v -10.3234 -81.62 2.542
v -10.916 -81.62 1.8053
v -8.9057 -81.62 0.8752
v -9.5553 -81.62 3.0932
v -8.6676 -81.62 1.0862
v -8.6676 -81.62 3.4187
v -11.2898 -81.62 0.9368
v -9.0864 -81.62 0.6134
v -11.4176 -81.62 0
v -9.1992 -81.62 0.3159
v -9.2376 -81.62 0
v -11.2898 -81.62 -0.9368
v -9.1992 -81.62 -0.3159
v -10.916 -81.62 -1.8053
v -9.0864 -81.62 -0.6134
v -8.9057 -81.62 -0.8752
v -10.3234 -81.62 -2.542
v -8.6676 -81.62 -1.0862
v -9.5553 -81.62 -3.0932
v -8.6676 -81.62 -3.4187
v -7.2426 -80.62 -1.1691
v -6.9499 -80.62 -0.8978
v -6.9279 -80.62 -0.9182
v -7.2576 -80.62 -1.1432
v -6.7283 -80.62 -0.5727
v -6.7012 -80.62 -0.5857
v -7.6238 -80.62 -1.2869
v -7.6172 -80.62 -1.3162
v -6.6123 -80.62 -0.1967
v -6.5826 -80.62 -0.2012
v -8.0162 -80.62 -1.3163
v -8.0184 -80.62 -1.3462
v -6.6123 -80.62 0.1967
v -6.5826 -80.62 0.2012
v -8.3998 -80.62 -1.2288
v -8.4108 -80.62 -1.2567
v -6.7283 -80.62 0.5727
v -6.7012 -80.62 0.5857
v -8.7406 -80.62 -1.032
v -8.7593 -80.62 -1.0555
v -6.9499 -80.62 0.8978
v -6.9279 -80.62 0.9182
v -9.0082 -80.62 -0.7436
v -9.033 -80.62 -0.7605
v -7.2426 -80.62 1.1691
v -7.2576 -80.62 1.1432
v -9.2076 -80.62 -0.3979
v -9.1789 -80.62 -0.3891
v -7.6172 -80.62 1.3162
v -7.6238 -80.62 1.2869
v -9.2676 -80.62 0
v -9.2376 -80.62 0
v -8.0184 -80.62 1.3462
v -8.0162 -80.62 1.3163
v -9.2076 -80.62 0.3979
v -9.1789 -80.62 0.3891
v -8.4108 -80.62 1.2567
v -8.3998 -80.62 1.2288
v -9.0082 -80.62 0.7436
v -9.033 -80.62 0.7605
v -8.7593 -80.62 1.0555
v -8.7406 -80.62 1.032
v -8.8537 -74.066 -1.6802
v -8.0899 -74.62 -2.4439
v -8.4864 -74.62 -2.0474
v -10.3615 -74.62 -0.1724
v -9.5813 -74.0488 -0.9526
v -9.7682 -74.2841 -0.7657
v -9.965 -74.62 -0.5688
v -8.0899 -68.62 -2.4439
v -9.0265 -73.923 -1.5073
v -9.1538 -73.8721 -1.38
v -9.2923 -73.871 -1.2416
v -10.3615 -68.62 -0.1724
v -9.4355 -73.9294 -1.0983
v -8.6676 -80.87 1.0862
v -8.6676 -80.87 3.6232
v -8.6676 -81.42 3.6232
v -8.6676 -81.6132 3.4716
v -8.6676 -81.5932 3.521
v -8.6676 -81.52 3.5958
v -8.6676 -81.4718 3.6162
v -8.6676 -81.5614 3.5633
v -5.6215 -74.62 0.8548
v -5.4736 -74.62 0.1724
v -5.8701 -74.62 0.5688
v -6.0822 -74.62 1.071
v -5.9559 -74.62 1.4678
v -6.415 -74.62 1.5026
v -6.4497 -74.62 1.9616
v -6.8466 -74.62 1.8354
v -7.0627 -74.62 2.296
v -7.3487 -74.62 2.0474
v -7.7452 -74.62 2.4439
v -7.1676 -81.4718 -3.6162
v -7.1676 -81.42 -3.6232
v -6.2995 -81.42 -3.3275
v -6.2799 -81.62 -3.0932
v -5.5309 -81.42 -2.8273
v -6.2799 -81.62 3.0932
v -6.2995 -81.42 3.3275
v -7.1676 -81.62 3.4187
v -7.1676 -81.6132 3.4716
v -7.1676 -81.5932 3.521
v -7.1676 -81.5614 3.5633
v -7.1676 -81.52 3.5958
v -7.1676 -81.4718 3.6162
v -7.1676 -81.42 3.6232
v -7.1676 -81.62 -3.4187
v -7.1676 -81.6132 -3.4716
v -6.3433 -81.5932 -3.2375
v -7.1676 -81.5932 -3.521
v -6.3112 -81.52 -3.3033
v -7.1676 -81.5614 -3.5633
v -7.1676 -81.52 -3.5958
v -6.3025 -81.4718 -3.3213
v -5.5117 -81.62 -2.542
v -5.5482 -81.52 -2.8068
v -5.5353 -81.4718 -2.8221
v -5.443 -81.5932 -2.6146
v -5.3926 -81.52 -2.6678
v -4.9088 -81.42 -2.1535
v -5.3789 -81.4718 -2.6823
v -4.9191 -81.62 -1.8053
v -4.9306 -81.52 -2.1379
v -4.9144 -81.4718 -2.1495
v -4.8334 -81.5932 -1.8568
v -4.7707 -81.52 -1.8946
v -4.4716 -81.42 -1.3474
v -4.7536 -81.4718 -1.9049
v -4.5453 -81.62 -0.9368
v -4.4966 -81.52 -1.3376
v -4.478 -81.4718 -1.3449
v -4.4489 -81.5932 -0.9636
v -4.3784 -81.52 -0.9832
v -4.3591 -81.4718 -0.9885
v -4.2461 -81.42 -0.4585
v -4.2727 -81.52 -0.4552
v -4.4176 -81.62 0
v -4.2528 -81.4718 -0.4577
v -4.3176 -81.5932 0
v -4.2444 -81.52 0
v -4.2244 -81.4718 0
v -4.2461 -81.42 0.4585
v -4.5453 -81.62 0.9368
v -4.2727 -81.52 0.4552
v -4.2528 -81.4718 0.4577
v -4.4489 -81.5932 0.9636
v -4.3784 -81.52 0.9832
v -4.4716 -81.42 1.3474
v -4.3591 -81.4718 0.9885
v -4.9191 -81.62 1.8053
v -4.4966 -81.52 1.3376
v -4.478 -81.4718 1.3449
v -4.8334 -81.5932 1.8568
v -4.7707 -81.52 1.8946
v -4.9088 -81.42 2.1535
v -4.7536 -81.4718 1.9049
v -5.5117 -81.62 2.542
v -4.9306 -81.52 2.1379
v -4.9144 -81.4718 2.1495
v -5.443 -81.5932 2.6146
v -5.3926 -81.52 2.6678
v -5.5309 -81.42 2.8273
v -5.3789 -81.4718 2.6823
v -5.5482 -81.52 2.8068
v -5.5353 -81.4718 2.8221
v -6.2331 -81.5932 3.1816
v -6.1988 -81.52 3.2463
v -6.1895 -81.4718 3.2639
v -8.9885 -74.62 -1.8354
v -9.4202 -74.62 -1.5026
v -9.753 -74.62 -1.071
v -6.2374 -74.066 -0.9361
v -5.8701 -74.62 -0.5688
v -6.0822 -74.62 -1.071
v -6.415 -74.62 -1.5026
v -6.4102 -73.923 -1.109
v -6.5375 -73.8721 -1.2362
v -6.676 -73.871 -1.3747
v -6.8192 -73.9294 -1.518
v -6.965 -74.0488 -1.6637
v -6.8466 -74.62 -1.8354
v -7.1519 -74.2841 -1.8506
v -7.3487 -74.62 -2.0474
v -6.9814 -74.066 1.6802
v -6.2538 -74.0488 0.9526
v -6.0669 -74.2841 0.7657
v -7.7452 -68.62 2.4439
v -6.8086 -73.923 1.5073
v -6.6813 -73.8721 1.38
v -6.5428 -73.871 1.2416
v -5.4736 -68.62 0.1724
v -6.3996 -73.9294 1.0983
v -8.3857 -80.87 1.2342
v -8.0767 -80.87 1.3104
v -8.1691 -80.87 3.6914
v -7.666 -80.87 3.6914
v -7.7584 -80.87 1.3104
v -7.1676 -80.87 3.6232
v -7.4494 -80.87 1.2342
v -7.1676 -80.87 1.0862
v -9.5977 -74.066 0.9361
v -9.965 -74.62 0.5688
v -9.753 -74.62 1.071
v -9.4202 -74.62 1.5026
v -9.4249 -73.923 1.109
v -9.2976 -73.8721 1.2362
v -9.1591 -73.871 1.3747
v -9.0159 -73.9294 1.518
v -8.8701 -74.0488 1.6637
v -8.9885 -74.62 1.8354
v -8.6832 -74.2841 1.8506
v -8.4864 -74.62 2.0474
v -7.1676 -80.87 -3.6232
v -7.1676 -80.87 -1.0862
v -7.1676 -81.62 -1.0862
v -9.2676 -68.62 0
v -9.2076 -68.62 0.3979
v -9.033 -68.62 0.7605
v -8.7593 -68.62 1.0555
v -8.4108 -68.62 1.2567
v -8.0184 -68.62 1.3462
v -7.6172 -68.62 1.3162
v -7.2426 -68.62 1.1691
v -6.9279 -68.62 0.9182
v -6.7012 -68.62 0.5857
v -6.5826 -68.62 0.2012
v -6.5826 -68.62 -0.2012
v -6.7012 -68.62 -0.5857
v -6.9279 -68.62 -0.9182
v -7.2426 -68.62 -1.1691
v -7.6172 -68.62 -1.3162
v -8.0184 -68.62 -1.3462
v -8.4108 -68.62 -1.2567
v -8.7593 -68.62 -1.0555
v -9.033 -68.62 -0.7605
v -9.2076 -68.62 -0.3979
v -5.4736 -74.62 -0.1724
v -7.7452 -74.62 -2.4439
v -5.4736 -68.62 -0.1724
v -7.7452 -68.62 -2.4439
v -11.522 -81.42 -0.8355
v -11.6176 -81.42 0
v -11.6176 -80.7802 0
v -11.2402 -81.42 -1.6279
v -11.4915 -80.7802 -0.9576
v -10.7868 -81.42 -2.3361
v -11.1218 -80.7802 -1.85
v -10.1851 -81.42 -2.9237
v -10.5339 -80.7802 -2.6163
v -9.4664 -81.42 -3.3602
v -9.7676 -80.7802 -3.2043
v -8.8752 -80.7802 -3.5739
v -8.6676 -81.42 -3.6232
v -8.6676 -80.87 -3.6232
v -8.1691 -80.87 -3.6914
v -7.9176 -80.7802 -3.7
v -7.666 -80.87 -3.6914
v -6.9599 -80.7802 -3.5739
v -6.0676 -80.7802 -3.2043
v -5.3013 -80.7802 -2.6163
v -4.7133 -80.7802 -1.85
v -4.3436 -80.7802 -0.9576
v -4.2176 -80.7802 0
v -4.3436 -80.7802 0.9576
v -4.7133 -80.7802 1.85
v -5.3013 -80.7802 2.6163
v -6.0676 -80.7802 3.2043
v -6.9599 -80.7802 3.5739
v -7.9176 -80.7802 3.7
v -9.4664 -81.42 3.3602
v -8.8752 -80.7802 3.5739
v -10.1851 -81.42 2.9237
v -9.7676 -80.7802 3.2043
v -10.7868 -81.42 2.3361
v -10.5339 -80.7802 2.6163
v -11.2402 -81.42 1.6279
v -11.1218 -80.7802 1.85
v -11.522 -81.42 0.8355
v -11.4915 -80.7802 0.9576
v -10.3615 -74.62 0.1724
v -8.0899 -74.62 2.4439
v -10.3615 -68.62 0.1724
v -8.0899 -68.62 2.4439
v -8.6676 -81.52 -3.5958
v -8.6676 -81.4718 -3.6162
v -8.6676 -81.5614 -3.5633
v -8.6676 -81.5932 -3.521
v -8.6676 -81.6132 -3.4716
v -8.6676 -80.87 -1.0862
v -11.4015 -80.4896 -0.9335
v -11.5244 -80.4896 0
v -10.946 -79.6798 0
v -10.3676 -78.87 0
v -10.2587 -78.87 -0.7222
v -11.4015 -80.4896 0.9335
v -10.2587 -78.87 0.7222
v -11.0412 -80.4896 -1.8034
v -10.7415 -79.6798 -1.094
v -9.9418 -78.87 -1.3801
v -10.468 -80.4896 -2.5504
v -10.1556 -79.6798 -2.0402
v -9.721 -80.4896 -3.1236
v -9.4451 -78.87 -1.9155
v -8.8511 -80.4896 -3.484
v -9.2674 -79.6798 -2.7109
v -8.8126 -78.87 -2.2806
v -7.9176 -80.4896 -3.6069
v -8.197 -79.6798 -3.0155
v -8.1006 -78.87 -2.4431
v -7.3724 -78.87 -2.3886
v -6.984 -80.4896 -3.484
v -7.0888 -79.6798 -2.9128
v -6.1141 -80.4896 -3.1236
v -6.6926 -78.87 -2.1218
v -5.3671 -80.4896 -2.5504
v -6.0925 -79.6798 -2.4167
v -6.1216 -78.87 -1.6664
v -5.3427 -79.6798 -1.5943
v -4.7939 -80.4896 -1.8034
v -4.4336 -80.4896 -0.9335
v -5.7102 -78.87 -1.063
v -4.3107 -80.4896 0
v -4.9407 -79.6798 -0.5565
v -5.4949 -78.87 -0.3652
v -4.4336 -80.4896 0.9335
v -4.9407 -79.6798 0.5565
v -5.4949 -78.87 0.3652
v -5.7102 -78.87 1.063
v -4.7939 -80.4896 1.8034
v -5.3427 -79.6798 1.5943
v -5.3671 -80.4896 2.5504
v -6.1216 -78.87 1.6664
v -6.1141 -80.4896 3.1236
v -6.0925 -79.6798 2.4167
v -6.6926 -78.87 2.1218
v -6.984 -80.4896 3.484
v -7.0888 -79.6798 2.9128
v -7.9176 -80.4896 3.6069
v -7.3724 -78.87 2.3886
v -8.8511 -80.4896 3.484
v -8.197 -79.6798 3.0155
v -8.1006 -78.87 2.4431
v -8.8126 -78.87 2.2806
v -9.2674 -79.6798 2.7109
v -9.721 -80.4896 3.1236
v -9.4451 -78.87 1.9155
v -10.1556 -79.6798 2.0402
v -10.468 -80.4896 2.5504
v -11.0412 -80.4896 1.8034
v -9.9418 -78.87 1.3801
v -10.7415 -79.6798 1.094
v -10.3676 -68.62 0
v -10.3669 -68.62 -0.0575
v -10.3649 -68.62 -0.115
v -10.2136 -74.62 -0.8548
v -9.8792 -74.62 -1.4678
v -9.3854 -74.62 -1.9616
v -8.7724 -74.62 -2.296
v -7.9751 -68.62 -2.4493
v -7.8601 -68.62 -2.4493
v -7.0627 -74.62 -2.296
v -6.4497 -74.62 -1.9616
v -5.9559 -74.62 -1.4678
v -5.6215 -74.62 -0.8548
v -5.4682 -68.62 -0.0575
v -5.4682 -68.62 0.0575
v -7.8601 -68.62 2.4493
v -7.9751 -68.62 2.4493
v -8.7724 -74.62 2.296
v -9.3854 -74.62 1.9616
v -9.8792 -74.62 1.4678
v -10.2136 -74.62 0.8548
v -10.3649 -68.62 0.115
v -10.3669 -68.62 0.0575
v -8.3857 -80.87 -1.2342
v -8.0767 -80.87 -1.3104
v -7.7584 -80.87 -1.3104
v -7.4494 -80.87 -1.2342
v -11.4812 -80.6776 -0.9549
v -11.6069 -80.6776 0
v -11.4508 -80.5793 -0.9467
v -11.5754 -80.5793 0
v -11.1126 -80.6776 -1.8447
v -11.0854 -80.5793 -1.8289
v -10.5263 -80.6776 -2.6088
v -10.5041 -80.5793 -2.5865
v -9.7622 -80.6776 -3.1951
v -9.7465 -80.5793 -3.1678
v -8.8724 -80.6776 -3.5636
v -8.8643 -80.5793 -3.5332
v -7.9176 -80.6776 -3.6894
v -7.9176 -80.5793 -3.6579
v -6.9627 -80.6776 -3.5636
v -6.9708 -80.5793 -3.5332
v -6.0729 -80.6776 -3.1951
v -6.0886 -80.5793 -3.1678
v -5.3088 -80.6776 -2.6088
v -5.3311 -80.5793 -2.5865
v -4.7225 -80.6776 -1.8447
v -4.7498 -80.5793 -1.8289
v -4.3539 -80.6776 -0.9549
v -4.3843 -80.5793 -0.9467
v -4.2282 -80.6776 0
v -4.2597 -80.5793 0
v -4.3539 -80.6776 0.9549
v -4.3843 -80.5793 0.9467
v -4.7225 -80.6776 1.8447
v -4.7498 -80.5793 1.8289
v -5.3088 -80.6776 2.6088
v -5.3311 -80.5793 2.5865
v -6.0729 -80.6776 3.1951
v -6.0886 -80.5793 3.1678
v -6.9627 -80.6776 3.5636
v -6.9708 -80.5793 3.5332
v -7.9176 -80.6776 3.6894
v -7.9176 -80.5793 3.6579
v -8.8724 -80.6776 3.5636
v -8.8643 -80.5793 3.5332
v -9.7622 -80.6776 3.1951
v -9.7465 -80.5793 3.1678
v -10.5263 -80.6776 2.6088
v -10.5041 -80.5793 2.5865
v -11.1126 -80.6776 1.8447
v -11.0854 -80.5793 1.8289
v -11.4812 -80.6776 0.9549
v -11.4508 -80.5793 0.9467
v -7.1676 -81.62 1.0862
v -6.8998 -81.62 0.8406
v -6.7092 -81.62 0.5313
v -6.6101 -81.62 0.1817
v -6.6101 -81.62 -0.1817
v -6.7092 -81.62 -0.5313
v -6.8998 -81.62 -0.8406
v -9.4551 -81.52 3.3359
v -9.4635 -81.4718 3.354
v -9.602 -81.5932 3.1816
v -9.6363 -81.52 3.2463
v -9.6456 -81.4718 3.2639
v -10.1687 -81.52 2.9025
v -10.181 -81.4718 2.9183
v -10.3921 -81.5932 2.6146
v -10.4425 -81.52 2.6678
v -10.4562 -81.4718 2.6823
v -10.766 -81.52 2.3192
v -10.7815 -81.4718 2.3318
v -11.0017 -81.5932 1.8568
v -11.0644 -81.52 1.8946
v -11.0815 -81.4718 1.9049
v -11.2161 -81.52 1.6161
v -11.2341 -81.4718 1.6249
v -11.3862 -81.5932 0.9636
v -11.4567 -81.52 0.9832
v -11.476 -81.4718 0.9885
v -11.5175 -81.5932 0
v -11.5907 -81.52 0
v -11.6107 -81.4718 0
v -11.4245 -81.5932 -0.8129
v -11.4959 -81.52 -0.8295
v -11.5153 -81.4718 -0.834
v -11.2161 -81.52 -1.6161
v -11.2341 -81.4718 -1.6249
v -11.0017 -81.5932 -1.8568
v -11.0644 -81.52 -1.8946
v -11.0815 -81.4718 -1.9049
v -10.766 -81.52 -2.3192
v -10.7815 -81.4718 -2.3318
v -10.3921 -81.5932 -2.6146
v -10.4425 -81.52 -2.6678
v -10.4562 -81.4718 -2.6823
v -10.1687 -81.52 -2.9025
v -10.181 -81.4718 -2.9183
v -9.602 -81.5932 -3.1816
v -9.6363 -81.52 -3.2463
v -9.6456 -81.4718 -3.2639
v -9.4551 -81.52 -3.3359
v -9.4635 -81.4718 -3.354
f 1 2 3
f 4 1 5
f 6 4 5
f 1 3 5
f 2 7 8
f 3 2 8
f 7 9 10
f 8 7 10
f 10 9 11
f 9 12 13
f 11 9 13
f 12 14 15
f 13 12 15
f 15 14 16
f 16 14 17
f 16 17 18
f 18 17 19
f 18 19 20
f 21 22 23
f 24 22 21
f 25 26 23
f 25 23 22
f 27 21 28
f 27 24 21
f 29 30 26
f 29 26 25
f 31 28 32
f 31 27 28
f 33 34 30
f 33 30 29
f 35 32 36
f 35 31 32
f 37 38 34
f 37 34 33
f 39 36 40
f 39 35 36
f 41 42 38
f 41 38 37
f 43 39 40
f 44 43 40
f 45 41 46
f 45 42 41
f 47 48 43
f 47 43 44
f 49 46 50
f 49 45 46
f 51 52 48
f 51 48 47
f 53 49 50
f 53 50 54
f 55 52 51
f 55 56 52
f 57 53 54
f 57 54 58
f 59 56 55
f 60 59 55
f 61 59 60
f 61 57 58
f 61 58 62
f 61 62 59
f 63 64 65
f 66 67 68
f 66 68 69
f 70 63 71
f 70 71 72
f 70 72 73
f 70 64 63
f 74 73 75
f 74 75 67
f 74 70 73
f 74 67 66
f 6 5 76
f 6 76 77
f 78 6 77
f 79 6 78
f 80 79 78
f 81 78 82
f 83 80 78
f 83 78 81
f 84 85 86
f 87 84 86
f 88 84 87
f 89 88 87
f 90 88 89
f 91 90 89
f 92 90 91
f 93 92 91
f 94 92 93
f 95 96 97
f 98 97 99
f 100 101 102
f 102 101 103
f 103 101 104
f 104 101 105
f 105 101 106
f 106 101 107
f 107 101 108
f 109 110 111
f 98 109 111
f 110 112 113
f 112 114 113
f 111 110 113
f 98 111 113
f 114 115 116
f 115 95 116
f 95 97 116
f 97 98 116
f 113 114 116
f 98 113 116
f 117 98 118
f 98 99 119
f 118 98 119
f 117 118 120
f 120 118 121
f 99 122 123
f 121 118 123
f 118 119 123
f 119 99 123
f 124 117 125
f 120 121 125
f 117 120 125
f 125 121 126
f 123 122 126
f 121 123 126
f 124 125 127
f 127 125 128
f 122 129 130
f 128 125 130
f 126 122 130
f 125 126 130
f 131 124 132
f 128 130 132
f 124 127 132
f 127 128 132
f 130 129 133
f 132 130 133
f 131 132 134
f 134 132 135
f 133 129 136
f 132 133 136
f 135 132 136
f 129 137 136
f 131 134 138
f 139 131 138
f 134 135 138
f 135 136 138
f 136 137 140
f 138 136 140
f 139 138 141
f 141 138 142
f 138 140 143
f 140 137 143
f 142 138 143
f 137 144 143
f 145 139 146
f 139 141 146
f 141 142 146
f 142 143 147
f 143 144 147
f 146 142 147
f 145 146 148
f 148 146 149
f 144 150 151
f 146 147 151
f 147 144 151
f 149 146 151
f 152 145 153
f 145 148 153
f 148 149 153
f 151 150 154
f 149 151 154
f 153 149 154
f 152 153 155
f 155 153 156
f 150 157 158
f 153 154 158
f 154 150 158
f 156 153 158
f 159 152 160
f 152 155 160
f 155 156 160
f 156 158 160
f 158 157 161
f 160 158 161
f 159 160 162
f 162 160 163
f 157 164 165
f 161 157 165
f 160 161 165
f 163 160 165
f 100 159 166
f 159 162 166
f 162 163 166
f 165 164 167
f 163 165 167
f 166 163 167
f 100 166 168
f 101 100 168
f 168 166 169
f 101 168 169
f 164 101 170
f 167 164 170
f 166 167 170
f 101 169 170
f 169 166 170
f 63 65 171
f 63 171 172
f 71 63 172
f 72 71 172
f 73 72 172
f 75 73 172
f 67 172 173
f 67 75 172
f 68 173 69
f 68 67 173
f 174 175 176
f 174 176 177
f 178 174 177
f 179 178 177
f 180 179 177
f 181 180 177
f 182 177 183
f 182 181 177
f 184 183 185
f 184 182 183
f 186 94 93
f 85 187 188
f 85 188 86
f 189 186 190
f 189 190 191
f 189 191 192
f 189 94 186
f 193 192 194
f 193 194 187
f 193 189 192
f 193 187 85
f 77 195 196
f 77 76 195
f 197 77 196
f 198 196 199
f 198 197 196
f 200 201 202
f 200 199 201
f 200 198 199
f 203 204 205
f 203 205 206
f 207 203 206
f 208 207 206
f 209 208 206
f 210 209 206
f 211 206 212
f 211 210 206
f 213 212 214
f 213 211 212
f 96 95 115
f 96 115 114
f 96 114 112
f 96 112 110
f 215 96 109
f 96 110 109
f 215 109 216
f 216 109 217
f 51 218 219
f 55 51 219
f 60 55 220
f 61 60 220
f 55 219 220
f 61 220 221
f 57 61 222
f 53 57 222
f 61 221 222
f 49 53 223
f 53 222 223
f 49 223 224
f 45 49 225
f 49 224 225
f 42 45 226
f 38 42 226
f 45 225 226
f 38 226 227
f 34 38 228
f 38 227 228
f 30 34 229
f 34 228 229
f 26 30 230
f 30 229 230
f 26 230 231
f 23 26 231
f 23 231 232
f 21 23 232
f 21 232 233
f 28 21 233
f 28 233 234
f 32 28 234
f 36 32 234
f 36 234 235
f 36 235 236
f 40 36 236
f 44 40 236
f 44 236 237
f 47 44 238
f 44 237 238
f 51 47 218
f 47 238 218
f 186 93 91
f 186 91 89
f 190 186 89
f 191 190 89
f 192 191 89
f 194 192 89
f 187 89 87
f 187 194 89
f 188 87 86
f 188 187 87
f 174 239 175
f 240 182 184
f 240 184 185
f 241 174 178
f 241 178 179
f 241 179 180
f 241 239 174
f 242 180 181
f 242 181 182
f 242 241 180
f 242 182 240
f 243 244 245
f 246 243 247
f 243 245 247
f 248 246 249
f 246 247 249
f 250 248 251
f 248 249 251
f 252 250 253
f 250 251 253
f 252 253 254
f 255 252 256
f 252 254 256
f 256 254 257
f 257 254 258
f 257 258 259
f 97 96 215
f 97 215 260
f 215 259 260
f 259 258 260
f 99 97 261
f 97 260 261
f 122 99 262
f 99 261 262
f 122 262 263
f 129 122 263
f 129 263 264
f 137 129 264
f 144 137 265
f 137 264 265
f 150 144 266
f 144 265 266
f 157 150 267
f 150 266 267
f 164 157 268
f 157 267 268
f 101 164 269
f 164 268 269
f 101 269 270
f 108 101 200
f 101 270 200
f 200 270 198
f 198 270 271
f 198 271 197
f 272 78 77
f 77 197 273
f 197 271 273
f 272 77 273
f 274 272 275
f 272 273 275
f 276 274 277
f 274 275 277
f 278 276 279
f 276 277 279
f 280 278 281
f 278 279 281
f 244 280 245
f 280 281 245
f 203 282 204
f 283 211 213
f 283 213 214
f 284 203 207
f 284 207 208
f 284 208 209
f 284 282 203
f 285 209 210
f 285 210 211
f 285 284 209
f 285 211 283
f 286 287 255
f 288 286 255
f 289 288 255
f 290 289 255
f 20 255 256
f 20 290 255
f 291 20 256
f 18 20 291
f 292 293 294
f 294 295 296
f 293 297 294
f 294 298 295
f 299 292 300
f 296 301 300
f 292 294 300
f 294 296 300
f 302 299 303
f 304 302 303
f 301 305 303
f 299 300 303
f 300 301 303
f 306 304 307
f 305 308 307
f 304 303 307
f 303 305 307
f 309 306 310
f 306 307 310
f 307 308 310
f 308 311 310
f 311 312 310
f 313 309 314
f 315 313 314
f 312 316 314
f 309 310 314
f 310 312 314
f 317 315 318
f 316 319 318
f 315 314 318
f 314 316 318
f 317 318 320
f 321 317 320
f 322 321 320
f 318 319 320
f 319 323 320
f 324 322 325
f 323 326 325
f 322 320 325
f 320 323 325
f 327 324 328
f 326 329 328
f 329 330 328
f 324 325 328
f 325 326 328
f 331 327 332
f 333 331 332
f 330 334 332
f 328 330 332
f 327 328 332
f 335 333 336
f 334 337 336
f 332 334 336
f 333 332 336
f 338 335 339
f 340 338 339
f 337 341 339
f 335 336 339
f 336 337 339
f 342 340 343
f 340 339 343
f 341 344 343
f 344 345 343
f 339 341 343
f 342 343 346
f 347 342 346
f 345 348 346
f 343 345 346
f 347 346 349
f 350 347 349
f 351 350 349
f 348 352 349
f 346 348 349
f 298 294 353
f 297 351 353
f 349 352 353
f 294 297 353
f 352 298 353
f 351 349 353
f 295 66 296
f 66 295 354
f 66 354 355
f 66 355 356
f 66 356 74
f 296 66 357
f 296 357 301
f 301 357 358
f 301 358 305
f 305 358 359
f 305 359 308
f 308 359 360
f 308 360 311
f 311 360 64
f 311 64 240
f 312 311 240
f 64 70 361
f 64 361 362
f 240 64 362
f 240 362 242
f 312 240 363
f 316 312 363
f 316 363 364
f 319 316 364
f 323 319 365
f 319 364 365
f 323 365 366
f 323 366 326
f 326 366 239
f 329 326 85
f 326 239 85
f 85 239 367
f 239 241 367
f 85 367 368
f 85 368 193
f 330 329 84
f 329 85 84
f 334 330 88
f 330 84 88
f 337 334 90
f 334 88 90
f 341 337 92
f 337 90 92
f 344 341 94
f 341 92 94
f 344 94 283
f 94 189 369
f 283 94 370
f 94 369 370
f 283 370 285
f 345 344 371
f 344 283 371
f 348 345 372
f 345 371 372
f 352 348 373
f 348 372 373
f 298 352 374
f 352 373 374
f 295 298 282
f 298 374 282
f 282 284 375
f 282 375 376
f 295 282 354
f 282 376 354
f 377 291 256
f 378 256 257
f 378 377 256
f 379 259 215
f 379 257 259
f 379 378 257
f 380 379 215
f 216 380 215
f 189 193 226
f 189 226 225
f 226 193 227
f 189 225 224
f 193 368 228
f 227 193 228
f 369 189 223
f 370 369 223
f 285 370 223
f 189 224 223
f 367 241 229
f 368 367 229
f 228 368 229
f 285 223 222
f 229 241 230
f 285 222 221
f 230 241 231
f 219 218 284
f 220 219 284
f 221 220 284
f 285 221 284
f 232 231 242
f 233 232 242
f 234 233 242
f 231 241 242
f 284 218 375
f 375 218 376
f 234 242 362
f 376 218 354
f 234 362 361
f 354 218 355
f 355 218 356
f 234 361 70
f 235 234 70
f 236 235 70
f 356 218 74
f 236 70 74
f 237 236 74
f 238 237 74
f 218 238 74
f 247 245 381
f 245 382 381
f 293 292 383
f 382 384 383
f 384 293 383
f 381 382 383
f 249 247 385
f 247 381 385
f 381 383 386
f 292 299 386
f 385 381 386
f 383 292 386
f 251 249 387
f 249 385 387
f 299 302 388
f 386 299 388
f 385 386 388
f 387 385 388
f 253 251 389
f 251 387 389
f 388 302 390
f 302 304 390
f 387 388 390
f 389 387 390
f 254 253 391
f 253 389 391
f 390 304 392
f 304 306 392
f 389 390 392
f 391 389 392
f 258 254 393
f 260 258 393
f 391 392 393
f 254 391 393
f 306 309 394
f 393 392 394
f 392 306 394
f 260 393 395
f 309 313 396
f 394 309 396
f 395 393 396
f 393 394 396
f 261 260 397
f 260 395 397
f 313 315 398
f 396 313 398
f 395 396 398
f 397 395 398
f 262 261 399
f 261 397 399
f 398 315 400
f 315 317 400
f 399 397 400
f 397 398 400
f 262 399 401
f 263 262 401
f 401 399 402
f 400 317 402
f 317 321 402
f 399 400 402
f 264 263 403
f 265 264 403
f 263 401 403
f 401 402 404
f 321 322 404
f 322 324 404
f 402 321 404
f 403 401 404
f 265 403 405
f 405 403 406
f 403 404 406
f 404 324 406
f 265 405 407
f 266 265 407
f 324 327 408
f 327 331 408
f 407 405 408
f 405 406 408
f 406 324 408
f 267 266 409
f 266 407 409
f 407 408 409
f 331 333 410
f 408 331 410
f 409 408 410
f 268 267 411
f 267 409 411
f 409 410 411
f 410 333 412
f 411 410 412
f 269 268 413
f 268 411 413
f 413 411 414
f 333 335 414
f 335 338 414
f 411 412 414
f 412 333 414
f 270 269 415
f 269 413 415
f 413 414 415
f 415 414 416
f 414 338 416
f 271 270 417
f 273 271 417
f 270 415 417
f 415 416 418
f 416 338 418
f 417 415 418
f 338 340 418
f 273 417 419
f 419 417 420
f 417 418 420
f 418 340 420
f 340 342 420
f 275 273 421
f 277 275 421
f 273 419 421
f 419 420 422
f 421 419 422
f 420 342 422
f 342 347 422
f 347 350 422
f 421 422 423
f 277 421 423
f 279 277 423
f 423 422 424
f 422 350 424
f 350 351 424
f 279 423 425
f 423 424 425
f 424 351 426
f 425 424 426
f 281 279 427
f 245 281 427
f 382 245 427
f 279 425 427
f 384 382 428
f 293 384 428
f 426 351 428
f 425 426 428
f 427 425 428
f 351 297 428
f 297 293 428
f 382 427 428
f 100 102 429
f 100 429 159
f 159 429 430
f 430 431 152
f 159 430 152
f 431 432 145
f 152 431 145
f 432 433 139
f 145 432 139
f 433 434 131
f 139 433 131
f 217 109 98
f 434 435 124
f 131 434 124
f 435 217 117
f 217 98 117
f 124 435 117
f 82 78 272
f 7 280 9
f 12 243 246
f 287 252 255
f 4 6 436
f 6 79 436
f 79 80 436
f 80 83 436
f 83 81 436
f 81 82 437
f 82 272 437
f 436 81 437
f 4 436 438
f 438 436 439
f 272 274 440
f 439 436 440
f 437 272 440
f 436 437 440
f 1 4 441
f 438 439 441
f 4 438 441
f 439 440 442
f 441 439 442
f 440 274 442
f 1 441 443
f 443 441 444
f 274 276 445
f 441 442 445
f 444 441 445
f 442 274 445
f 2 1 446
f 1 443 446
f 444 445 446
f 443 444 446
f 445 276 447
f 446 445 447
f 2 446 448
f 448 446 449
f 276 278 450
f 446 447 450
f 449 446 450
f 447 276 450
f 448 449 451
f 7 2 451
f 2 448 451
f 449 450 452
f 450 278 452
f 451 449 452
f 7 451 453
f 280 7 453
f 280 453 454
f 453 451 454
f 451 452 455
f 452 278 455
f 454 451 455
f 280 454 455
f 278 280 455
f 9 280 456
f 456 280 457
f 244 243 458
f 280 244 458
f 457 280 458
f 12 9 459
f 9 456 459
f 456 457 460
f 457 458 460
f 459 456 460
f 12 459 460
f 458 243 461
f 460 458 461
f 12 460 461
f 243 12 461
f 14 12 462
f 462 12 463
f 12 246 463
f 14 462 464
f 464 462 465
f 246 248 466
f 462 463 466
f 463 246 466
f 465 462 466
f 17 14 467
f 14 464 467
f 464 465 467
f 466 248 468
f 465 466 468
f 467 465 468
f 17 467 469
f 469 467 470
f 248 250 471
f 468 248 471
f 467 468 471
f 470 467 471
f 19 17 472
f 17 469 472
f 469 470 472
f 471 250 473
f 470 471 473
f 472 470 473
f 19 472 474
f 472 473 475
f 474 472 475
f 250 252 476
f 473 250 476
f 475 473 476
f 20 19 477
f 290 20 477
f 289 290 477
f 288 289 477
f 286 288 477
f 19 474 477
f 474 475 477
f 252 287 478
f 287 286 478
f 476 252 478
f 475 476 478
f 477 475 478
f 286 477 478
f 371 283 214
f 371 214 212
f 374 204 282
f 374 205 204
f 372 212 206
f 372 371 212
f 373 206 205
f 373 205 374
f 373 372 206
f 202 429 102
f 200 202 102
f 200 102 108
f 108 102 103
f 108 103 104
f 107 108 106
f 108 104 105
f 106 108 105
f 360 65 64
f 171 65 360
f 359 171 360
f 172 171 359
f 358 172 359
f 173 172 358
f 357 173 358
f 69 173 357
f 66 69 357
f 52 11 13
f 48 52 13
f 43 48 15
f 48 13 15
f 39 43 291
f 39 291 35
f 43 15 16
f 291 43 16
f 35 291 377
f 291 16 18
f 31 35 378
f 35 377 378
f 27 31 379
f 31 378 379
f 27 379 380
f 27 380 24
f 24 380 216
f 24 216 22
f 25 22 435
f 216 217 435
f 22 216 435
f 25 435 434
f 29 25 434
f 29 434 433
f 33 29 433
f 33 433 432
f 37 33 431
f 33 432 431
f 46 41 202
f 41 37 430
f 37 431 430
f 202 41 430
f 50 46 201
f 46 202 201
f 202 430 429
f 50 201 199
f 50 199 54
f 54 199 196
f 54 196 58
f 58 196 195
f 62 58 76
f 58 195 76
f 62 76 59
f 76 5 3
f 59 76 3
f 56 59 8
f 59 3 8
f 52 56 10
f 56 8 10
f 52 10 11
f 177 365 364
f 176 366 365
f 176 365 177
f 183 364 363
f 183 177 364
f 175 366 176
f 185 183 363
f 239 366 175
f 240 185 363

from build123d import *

# Parameters (mm, degrees)
SKETCH2_OUTSIDE_W = 12.738
SKETCH2_OUTSIDE_H = 12.738
EXTRUDE1_DEPTH    = 6
SKETCH3_R         = 2.125
EXTRUDE2_DEPTH    = 2
EXTRUDE2_TAPER    = 20
SKETCH4_R         = 1.35
EXTRUDE3_DEPTH    = 12
SKETCH5_W         = 1.5
SKETCH5_H         = 7.5
EXTRUDE4_DEPTH    = 0.75


with BuildPart() as part:
    # Sketch1 → Revolve1 (revolve)
    with BuildSketch(Plane.XY, mode=Mode.PRIVATE) as revolve1_sk:
        with BuildLine():
            Line((-6.597555333, -81.619969832), (-4.417555333, -81.619969832))
            ThreePointArc((-4.417555333, -81.619969832), (-4.276133977, -81.561391188), (-4.217555333, -81.419969832))
            Line((-4.217555333, -81.419969832), (-4.217555333, -80.780202359))
            ThreePointArc((-4.217555333, -80.780202359), (-4.241407579, -80.627613643), (-4.310688598, -80.489583262))
            Line((-4.310688598, -80.489583262), (-5.467555333, -78.869969832))
            Line((-5.467555333, -78.869969832), (-5.467555333, -72.569969832))
            Line((-5.467555333, -72.569969832), (-5.467555333, -68.619969832))
            Line((-5.467555333, -68.619969832), (-6.597555333, -68.619969832))
            Line((-6.597555333, -68.619969832), (-6.597555333, -81.619969832))
        make_face()
    revolve(revolve1_sk.sketch.rotate(Axis((-7.917555333, -68.619969832, 0), (0, -1, 0)), 180), axis=Axis((-7.917555333, -68.619969832, 0), (0, -1, 0)))

    # Sketch2 outside → Extrude1 (cut)
    with BuildSketch(Plane(origin=(0, -68.619969832, 0), x_dir=(-1, 0, 0), z_dir=(0, 1, 0))):
        with Locations((7.918, 0)):
            Rectangle(SKETCH2_OUTSIDE_W, SKETCH2_OUTSIDE_H)
        Polygon((5.301260243, 0), (7.917555333, -2.61629509), (10.533850424, 0), (7.917555333, 2.61629509), align=None, mode=Mode.SUBTRACT)
    extrude(amount=-EXTRUDE1_DEPTH, mode=Mode.SUBTRACT)

    # Sketch3 → Extrude2 (add)
    with BuildSketch(Plane(origin=(0, -74.619969832, 0), x_dir=(-1, 0, 0), z_dir=(0, 1, 0))):
        with Locations((7.917555333, 0)):
            Circle(SKETCH3_R)
    extrude(amount=EXTRUDE2_DEPTH, taper=EXTRUDE2_TAPER)

    # Sketch4 → Extrude3 (cut)
    with BuildSketch(Plane(origin=(0, -68.619969832, 0), x_dir=(-1, 0, 0), z_dir=(0, 1, 0))):
        with Locations((7.917555333, 0)):
            Circle(SKETCH4_R)
    extrude(amount=-EXTRUDE3_DEPTH, mode=Mode.SUBTRACT)

    # Sketch5 → Extrude4 (cut)
    with BuildSketch(Plane.XZ.offset(81.619969832)):
        with Locations((-7.917555333, 0)):
            Rectangle(SKETCH5_W, SKETCH5_H)
    extrude(amount=-EXTRUDE4_DEPTH, mode=Mode.SUBTRACT)


solid = part.part
